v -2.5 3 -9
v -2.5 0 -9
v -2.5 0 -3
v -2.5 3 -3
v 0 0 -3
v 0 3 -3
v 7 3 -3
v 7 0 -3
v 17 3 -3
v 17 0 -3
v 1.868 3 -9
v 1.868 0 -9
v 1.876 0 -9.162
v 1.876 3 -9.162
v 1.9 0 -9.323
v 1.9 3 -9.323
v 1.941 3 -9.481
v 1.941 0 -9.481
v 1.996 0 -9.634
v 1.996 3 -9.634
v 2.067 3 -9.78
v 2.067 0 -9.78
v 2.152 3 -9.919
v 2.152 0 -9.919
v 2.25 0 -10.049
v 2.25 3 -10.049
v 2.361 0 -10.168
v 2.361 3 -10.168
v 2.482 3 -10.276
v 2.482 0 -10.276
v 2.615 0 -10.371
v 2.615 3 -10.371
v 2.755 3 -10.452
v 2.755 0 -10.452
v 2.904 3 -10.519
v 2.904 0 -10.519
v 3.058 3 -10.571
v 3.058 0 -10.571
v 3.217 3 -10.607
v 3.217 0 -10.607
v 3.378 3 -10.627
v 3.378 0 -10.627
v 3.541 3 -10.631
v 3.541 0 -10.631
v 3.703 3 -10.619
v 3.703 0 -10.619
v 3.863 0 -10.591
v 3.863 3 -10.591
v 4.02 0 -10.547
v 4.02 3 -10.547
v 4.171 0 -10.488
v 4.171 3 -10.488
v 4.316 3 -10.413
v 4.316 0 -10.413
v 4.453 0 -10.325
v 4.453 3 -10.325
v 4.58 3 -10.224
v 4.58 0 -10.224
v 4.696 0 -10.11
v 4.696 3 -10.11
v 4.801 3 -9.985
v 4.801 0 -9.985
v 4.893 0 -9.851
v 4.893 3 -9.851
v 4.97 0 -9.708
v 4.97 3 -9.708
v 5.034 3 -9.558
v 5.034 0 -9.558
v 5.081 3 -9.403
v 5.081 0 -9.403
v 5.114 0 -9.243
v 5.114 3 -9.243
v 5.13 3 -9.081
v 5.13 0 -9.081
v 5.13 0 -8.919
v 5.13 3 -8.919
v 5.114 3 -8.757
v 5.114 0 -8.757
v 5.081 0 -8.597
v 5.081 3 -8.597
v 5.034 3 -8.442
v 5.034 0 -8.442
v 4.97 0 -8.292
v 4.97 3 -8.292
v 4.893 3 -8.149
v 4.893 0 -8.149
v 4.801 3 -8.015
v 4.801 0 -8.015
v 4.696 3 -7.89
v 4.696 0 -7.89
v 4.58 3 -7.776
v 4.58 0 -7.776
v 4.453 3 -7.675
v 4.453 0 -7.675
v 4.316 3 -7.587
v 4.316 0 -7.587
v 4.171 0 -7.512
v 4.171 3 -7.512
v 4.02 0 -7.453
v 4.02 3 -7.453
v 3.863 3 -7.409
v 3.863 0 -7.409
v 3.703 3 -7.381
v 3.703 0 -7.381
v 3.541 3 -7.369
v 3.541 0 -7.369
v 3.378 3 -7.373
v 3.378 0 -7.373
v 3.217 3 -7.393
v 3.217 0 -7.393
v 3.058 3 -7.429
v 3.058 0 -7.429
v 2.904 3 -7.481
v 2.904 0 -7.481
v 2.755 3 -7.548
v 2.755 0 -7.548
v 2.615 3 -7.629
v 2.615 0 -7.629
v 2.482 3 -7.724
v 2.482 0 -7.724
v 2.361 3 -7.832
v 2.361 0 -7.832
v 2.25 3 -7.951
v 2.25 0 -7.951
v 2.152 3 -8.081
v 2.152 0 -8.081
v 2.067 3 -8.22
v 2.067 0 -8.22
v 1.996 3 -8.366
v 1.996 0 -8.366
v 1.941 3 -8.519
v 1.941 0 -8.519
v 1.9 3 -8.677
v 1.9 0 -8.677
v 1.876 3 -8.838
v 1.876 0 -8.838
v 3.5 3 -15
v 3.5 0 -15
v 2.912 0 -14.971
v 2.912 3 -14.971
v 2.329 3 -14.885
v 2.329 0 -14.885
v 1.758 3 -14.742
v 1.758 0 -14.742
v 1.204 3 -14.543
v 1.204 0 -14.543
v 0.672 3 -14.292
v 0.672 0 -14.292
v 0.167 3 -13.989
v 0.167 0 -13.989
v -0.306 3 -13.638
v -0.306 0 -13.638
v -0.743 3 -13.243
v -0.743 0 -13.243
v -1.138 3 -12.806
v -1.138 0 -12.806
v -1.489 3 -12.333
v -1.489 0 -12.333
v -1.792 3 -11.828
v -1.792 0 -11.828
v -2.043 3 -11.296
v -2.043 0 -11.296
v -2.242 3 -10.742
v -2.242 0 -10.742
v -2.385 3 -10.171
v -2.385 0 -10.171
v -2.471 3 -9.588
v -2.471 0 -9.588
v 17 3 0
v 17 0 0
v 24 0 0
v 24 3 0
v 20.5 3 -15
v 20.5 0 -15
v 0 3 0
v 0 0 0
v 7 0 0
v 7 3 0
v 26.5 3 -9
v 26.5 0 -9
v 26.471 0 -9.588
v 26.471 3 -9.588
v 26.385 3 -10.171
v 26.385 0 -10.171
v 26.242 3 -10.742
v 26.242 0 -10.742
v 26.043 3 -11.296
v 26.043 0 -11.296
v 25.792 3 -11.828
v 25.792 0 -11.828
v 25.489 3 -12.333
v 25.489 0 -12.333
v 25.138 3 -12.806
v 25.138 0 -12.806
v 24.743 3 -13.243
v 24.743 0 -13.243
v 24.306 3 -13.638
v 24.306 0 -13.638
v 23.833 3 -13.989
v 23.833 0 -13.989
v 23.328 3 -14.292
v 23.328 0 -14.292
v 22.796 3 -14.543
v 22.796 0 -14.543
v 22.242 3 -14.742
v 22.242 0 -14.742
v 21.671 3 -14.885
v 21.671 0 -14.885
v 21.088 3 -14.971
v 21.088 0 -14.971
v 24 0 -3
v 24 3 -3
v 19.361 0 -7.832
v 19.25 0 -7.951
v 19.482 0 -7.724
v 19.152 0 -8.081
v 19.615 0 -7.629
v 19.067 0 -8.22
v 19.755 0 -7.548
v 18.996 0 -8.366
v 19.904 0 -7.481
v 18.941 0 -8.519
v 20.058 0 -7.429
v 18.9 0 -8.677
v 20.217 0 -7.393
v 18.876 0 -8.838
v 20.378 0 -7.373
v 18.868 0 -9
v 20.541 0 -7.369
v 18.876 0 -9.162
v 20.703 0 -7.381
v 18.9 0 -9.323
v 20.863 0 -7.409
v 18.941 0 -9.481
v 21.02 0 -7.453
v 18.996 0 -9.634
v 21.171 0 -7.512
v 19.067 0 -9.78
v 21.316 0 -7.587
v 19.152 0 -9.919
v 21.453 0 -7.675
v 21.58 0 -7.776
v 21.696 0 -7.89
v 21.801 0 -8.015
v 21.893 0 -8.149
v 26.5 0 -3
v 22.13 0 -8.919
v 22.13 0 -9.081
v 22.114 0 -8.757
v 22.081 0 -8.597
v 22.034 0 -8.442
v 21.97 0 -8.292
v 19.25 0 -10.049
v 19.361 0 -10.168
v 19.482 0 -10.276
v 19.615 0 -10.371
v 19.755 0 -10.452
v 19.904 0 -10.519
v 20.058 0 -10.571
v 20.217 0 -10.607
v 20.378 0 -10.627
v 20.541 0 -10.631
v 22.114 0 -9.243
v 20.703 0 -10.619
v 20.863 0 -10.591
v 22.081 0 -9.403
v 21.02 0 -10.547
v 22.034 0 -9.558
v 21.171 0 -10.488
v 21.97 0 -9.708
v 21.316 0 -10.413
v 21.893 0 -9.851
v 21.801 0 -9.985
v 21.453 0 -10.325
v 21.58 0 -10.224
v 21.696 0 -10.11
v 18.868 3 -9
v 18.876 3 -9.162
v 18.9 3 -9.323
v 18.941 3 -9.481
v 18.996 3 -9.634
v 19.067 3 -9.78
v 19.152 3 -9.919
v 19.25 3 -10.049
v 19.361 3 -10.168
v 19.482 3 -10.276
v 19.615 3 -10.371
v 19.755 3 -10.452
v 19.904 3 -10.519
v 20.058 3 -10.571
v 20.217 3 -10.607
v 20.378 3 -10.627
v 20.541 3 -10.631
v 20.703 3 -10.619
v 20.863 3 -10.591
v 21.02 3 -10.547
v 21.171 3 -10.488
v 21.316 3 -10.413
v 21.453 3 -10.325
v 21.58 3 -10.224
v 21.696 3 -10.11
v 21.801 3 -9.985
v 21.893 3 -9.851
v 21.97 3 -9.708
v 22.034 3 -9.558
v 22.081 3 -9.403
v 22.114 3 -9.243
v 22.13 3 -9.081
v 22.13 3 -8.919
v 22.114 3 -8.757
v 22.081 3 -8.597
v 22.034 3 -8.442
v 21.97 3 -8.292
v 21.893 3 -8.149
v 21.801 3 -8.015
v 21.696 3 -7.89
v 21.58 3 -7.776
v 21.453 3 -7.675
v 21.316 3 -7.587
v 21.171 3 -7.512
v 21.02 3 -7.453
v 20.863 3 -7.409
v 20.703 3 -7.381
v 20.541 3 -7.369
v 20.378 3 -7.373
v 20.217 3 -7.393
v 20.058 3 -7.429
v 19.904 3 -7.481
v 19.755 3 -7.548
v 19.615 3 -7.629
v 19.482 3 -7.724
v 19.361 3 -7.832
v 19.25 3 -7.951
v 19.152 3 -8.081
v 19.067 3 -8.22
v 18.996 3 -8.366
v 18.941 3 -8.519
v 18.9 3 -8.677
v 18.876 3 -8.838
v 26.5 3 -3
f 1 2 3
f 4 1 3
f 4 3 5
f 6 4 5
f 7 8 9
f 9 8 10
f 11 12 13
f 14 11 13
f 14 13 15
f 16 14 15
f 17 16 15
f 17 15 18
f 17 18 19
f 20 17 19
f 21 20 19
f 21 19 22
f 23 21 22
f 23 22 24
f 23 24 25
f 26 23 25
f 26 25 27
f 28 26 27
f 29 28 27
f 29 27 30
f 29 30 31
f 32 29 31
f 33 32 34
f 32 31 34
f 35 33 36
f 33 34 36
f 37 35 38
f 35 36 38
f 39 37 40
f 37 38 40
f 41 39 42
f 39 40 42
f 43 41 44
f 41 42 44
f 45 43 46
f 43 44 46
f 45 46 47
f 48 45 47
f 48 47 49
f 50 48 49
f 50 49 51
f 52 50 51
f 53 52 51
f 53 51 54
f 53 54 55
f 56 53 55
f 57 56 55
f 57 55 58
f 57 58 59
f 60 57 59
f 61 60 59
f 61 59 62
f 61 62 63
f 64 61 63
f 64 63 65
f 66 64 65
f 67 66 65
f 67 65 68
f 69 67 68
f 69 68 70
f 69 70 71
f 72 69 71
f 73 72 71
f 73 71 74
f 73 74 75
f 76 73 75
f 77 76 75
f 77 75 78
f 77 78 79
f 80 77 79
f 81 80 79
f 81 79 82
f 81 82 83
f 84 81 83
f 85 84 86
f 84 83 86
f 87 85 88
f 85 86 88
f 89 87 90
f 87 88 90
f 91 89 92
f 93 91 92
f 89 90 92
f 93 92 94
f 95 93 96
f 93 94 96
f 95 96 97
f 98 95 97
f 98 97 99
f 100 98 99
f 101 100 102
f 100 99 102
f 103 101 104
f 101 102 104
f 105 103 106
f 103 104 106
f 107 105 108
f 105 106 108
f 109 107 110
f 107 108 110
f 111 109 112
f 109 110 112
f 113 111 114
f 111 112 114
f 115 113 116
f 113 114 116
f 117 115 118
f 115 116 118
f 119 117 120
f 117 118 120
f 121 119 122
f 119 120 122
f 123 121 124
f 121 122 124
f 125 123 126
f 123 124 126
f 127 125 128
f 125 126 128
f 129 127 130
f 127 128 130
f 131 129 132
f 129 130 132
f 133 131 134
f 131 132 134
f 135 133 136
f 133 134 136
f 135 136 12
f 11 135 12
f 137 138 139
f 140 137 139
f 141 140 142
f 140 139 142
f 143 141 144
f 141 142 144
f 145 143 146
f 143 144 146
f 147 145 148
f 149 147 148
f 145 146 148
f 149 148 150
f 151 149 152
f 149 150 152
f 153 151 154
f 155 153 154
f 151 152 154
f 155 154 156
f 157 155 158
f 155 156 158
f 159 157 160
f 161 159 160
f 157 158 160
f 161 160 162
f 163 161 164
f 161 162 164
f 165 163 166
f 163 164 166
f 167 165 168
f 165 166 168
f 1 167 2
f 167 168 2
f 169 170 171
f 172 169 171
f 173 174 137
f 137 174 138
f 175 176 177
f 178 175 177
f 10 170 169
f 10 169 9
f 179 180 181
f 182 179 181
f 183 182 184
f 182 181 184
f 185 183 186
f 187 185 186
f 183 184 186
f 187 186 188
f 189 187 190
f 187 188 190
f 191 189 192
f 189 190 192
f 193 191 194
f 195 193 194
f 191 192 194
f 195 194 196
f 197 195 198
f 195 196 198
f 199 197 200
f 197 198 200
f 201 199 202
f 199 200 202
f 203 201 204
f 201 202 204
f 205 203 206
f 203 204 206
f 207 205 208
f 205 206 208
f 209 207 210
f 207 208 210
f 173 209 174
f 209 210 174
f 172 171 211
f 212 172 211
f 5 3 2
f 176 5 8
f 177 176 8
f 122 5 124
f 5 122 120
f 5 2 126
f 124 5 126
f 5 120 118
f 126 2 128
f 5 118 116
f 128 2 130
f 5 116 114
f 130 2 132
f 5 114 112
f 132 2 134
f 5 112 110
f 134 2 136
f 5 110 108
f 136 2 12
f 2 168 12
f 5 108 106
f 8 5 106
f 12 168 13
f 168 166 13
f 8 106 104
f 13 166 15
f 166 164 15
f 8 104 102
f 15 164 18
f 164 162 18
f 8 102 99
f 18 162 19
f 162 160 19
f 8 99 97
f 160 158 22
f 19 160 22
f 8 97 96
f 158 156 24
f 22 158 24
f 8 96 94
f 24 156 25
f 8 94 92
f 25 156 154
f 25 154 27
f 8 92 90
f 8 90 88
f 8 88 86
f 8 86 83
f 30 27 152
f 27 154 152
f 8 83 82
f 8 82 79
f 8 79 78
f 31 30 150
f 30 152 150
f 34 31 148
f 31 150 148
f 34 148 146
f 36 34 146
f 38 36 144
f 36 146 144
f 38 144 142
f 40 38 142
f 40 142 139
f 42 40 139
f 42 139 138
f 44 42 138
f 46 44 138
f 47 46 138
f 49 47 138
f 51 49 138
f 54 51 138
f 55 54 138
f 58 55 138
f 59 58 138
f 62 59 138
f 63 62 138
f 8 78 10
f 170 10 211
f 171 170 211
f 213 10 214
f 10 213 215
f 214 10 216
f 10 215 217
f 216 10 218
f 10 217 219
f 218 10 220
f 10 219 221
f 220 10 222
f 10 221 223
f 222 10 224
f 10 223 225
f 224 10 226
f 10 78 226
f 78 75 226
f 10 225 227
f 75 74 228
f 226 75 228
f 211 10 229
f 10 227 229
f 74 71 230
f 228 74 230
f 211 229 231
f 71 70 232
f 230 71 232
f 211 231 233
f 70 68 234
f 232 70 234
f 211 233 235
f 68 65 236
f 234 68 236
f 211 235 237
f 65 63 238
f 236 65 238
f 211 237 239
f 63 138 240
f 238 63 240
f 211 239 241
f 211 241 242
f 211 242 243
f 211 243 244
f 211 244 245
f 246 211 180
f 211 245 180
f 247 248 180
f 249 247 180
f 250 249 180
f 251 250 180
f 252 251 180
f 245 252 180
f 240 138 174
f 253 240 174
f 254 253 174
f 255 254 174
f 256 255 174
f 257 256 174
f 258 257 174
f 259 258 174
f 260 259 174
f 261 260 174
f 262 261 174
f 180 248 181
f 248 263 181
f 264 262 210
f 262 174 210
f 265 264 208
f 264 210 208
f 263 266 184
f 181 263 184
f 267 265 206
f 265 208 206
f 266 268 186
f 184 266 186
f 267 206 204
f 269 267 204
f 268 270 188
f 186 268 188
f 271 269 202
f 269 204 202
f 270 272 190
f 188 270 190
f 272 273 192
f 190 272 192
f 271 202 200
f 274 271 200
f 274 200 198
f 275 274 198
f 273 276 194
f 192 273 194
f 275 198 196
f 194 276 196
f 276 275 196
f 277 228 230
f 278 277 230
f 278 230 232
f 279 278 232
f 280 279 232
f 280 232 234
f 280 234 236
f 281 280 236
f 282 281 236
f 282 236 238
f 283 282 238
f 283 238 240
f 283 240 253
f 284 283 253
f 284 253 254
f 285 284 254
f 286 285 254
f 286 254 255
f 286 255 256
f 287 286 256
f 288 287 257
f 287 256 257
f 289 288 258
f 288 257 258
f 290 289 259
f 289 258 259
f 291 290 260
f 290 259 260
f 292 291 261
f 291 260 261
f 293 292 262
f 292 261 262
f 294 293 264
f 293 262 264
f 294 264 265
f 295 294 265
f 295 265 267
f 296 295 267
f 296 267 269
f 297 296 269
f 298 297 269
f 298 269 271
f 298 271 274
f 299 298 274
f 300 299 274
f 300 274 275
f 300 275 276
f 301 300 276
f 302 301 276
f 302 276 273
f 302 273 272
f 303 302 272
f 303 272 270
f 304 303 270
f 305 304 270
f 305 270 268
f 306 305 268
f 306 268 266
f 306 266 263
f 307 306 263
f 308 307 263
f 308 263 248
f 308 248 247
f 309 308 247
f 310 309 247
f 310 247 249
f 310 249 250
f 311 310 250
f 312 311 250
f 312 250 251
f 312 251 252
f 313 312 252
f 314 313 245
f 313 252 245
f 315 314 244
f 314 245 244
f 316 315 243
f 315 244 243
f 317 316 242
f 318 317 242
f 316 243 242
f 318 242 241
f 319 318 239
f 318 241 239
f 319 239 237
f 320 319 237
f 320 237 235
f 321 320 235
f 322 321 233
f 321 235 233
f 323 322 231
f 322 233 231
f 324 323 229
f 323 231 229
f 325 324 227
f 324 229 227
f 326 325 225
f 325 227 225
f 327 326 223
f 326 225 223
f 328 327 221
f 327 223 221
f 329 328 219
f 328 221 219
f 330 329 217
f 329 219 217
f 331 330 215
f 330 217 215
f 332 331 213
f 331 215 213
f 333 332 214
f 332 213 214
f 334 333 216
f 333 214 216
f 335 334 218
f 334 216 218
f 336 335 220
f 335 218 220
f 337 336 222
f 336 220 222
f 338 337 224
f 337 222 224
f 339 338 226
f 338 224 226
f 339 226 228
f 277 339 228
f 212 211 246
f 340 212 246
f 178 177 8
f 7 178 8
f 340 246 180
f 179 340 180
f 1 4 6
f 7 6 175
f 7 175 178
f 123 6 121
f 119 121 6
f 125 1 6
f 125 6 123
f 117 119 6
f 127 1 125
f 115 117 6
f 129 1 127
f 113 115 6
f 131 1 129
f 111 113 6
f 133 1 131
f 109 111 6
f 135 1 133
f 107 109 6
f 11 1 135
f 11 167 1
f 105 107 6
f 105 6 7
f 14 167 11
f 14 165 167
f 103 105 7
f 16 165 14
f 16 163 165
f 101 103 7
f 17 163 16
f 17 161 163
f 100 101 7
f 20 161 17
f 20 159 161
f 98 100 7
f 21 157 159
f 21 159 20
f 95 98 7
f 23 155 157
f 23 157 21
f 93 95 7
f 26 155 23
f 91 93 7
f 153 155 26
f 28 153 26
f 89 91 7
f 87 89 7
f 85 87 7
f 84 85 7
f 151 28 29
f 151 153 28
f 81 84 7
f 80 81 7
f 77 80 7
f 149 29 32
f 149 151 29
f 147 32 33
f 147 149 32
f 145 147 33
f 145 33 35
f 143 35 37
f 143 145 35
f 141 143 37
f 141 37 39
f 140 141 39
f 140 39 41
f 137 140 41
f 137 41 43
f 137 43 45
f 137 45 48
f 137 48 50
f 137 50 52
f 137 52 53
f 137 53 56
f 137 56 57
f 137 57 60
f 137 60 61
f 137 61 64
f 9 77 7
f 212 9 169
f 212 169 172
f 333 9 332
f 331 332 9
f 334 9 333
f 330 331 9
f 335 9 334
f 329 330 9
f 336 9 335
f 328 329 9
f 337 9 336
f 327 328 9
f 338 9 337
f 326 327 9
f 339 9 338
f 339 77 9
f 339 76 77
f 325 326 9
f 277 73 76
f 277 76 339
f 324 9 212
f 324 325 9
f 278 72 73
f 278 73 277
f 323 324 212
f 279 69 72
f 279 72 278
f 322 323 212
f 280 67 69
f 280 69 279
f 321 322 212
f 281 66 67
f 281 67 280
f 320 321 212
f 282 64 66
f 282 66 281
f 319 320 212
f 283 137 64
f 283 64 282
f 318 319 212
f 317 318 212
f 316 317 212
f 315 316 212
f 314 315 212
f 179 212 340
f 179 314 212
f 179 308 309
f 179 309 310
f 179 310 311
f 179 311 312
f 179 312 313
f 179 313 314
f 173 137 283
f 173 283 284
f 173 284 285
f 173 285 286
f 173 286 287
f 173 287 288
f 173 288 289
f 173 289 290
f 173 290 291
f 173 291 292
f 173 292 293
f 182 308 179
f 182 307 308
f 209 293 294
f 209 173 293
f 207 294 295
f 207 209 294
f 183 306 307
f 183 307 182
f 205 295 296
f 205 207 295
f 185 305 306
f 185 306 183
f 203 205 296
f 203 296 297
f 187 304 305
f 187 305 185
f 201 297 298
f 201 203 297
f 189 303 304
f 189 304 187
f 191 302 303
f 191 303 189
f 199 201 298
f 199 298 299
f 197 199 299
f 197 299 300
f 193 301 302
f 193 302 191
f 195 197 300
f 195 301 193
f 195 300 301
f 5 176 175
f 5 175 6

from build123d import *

# Parameters (mm, degrees)
SKETCH1_W             = 7
SKETCH1_H             = 3
BOSS_EXTRUDE1_DEPTH   = 3
F_4_CLEARANCE_HOLE1_D = 3.2639


with BuildPart() as part:
    # Sketch1 → Boss-Extrude1 (new body)
    with BuildSketch(Plane(origin=(0, 0, 0), x_dir=(1, 0, 0), z_dir=(0, 1, 0))):
        with Locations((3.5, 1.5)):
            Rectangle(SKETCH1_W, SKETCH1_H)
        with BuildLine():
            Line((-2.5, 3), (0, 3))
            Line((0, 3), (7, 3))
            Line((7, 3), (17, 3))
            Line((17, 3), (24, 3))
            Line((24, 3), (26.5, 3))
            Line((26.5, 3), (26.5, 9))
            ThreePointArc((26.5, 9), (24.742640687, 13.242640687), (20.5, 15))
            Line((20.5, 15), (3.5, 15))
            ThreePointArc((3.5, 15), (-0.742640687, 13.242640687), (-2.5, 9))
            Line((-2.5, 9), (-2.5, 3))
        make_face()
        with Locations((20.5, 1.5)):
            Rectangle(SKETCH1_W, SKETCH1_H)
    extrude(amount=BOSS_EXTRUDE1_DEPTH)

    # #4 Clearance Hole1 (through all)
    with Locations(Plane(origin=(0, 3, 0), x_dir=(1, 0, 0), z_dir=(0, 1, 0))):
        with Locations((3.5, 9), (20.5, 9)):
            Hole(F_4_CLEARANCE_HOLE1_D / 2)


solid = part.part
